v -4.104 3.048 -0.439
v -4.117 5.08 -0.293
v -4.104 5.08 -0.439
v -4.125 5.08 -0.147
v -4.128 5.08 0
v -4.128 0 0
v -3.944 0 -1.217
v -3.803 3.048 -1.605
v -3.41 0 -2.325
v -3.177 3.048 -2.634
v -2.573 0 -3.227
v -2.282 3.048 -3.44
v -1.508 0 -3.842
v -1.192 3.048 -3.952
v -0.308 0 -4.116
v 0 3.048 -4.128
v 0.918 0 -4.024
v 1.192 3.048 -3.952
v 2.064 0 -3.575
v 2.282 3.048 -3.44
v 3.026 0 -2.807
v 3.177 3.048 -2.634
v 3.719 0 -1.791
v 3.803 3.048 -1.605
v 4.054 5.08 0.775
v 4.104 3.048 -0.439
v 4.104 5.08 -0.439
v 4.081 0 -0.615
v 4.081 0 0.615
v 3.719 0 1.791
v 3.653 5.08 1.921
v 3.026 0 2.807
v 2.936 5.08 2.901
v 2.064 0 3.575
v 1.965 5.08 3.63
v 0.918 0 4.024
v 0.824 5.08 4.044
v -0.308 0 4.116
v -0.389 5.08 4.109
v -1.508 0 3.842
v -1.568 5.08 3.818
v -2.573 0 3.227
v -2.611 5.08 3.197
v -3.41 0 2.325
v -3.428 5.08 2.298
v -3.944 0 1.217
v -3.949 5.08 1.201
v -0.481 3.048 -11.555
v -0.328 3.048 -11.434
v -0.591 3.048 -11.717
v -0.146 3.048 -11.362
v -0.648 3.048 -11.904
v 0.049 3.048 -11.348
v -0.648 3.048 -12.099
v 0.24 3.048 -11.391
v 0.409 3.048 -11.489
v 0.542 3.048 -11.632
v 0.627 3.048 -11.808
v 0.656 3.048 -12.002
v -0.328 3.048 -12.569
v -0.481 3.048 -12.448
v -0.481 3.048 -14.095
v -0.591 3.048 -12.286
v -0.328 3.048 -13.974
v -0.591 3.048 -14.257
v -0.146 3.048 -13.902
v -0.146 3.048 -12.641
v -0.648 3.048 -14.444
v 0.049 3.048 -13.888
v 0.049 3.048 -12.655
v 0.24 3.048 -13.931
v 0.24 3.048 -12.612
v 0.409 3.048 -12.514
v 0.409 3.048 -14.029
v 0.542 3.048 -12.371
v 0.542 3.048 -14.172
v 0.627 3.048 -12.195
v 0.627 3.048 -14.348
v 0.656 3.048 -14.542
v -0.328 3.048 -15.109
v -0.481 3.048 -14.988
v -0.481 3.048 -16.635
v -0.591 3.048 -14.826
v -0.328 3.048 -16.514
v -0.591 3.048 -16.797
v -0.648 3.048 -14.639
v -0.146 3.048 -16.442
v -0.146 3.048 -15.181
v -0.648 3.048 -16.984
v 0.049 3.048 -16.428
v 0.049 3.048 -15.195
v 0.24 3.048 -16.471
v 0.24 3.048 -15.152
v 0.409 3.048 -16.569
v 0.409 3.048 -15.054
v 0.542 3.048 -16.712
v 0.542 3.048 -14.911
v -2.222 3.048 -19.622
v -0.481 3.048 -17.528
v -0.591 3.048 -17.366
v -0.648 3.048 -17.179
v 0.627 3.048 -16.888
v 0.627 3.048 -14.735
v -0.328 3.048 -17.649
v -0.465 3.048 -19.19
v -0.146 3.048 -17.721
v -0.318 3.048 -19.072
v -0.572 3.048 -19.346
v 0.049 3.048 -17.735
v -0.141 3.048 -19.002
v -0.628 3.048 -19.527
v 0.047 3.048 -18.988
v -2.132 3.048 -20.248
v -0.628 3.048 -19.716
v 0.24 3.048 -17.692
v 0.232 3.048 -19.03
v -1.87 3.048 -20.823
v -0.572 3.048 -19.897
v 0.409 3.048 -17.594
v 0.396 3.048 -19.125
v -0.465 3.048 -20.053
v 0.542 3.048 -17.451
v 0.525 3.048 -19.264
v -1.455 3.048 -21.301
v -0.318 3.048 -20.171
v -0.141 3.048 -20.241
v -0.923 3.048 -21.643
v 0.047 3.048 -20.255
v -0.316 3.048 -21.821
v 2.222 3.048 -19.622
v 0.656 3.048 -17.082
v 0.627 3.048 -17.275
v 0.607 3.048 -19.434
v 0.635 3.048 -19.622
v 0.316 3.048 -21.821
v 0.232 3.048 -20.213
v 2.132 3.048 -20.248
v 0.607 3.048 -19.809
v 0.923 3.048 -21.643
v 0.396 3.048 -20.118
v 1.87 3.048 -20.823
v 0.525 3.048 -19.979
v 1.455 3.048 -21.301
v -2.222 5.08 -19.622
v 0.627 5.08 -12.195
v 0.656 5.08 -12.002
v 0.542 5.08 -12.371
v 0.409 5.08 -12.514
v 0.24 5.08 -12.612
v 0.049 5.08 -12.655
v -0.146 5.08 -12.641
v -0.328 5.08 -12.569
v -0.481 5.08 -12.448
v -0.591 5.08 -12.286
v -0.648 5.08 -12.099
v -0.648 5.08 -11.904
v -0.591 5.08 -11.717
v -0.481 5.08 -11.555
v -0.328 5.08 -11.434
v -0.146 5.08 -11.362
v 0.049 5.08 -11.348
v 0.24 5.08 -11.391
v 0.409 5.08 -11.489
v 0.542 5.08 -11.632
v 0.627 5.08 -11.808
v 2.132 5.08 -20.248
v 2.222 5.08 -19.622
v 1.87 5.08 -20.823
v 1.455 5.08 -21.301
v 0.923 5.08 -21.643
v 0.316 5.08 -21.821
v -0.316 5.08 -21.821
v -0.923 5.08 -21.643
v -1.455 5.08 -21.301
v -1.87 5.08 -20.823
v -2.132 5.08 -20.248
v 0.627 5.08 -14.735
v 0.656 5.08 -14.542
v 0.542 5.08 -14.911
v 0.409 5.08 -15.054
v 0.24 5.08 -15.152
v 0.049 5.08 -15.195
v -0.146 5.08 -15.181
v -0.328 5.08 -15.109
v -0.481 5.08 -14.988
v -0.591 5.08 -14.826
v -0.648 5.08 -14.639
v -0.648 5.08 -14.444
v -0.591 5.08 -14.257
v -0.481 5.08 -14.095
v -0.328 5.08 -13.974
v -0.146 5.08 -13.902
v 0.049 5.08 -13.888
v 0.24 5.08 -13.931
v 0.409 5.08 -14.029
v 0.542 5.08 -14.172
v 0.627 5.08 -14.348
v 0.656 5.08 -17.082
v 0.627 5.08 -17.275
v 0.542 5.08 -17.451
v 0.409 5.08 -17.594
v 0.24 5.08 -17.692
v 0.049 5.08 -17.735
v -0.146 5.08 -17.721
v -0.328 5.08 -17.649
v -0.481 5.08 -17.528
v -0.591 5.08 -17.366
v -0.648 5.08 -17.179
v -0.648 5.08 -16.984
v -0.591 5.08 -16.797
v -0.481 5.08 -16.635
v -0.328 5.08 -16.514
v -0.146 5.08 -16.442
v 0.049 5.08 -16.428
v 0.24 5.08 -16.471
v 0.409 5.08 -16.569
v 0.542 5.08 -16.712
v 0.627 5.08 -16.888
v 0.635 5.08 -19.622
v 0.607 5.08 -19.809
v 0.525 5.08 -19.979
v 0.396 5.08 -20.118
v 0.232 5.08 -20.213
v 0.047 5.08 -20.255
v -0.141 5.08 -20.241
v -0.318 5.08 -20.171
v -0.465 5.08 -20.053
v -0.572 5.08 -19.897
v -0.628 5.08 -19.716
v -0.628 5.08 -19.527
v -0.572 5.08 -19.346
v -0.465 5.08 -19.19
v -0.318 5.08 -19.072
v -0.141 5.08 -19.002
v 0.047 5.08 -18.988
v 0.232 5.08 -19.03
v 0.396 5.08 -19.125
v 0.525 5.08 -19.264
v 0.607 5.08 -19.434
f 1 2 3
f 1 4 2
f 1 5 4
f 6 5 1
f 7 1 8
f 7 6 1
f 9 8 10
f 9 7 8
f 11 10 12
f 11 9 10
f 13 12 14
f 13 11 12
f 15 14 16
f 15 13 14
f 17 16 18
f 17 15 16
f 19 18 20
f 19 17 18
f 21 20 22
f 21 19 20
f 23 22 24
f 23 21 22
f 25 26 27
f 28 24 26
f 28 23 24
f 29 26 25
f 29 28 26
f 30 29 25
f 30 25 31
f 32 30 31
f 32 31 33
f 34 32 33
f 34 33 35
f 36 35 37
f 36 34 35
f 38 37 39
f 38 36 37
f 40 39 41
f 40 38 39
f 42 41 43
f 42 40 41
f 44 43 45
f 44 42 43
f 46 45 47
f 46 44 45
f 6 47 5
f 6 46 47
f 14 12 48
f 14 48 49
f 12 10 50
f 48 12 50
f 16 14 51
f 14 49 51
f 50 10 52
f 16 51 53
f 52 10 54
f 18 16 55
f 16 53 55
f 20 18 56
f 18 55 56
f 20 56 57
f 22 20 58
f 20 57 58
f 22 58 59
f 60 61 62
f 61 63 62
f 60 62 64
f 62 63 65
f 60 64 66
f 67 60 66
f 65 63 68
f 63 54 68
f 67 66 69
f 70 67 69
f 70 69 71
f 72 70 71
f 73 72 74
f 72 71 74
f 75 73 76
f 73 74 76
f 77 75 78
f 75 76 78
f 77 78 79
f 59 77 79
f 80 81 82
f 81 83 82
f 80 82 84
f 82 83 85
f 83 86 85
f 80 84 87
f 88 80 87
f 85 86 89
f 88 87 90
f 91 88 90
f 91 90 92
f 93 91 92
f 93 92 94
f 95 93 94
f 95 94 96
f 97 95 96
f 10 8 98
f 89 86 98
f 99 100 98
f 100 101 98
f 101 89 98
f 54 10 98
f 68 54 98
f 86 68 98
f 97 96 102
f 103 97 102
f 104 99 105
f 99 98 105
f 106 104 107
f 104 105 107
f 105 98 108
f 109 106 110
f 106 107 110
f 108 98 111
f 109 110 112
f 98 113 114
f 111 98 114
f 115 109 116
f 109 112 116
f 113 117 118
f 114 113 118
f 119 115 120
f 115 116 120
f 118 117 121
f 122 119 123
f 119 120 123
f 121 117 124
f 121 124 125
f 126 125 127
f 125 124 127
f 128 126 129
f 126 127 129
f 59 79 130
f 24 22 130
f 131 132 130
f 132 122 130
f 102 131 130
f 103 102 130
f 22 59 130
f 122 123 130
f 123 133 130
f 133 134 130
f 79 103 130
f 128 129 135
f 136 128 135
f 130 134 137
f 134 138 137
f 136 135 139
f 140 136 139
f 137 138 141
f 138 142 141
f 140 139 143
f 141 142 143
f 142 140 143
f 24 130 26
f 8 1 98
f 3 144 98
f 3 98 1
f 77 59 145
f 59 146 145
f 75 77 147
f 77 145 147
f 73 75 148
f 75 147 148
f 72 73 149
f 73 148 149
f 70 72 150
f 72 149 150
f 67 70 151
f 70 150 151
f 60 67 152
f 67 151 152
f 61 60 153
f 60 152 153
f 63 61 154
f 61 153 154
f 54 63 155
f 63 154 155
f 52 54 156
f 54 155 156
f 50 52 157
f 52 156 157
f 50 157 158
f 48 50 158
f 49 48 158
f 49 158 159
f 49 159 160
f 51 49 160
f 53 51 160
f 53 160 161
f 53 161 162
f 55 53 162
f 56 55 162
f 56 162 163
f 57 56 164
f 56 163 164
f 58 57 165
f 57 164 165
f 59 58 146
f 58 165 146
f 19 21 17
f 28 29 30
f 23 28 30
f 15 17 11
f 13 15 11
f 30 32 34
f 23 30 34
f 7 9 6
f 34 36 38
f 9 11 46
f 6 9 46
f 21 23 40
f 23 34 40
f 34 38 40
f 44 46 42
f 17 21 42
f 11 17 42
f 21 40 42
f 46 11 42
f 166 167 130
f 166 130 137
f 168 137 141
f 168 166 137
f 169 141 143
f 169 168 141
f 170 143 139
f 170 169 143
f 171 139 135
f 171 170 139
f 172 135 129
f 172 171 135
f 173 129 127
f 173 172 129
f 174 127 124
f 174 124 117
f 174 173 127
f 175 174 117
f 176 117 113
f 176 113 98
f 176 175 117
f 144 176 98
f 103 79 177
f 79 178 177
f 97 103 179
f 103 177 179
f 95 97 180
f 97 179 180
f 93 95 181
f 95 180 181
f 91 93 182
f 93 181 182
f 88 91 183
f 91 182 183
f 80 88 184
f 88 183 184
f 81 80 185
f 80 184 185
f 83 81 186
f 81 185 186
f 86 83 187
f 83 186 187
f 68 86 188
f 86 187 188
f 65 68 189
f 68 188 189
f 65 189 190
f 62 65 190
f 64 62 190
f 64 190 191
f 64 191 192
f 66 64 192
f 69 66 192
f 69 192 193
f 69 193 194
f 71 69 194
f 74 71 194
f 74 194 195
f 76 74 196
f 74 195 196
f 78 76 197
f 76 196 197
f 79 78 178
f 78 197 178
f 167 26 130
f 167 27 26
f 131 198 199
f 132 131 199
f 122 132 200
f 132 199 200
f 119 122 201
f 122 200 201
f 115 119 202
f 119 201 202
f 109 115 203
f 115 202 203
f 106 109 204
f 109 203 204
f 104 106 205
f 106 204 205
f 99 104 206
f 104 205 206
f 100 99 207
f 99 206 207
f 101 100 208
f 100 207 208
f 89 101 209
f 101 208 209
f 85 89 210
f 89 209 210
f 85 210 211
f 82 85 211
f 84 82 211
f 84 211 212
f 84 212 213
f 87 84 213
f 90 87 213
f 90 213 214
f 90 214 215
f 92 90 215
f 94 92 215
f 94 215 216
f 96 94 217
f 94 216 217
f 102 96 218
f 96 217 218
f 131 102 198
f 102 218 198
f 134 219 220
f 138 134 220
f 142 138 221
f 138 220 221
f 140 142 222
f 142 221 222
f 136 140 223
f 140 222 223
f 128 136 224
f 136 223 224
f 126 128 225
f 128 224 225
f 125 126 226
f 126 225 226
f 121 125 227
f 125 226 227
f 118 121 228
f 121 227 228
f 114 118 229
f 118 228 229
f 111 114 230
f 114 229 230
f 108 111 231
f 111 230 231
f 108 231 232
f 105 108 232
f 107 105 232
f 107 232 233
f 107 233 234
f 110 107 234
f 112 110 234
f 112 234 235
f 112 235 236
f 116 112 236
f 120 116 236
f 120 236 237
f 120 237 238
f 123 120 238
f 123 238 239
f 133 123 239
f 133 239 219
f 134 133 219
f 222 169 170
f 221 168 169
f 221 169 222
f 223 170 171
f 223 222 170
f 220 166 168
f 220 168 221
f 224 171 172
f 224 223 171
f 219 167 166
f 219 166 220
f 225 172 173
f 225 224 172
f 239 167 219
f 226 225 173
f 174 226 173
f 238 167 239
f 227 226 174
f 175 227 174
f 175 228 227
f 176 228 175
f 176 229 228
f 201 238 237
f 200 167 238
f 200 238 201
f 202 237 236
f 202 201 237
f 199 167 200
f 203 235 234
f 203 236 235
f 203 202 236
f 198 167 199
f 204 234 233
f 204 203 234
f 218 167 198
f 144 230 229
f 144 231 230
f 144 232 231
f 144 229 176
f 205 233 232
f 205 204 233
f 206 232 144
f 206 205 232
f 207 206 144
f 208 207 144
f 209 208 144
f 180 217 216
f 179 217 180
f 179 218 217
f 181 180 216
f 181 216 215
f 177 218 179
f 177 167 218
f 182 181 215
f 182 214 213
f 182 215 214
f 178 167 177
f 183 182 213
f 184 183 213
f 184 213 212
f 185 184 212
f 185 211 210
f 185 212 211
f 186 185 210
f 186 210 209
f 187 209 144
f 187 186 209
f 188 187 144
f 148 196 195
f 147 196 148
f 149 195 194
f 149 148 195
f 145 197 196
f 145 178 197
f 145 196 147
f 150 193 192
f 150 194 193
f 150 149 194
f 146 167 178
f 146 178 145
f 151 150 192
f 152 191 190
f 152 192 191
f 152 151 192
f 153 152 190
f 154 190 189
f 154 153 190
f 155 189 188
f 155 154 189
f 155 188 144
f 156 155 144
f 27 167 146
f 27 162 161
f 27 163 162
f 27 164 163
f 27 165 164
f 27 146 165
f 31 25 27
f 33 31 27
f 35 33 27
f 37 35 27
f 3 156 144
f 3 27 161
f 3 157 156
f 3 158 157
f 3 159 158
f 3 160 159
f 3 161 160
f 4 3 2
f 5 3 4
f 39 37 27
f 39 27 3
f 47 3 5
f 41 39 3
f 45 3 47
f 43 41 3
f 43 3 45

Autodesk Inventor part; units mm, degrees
ref_plane "YZ Plane" through (0, 0, 0) normal (1, 0, 0) x (0, 1, 0)
ref_plane "XZ Plane" through (0, 0, 0) normal (0, 1, 0) x (-1, 0, 0)
ref_plane "XY Plane" through (0, 0, 0) normal (0, 0, 1) x (1, 0, 0)
sketch "Sketch1" plane through (0, 0, 0) normal (0, 1, 0) x (-1, 0, 0)
  circle A0 centre (0, 0) radius 4.1275
  dimension "d0" = 8.255
extrude "Extrusion1" add sketch "Sketch1" along normal blind 5.08
sketch "Sketch2" plane through (0, 5.08, 0) normal (0, 1, 0) x (1, 0, 0)
  circle A0 centre (0, 0) radius 4.1275 projected
  arc A1 (2.2225, 19.6215) -> (-2.2225, 19.6215) centre (0, 19.6215) ccw
  line L0 (-2.2225, 19.6215) -> (-4.1041, 0.4388)
  line L1 (4.1041, 0.4388) -> (2.2225, 19.6215)
  arc A2 (-4.1041, 0.4388) -> (4.1041, 0.4388) centre (0, 0) ccw
  dimension "d4" = 4.445
extrude "Extrusion2" add sketch "Sketch2" against normal blind 2.032
sketch "Sketch3" plane through (0, 5.08, 0) normal (0, 1, 0) x (1, 0, 0)
  arc A0 (2.2225, 19.6215) -> (-2.2225, 19.6215) centre (0, 19.6215) ccw projected
  circle A1 centre (0, 19.6215) radius 0.635
  circle A2 centre (0, 17.0815) radius 0.6558
  circle A3 centre (0, 14.5415) radius 0.6558
  circle A4 centre (0, 12.0015) radius 0.6558
  point P0 (0, 0)
  dimension "d7" = 1.27
extrude "Extrusion3" cut sketch "Sketch3" against normal blind 3.6195
properties part number "ServoHorn"
